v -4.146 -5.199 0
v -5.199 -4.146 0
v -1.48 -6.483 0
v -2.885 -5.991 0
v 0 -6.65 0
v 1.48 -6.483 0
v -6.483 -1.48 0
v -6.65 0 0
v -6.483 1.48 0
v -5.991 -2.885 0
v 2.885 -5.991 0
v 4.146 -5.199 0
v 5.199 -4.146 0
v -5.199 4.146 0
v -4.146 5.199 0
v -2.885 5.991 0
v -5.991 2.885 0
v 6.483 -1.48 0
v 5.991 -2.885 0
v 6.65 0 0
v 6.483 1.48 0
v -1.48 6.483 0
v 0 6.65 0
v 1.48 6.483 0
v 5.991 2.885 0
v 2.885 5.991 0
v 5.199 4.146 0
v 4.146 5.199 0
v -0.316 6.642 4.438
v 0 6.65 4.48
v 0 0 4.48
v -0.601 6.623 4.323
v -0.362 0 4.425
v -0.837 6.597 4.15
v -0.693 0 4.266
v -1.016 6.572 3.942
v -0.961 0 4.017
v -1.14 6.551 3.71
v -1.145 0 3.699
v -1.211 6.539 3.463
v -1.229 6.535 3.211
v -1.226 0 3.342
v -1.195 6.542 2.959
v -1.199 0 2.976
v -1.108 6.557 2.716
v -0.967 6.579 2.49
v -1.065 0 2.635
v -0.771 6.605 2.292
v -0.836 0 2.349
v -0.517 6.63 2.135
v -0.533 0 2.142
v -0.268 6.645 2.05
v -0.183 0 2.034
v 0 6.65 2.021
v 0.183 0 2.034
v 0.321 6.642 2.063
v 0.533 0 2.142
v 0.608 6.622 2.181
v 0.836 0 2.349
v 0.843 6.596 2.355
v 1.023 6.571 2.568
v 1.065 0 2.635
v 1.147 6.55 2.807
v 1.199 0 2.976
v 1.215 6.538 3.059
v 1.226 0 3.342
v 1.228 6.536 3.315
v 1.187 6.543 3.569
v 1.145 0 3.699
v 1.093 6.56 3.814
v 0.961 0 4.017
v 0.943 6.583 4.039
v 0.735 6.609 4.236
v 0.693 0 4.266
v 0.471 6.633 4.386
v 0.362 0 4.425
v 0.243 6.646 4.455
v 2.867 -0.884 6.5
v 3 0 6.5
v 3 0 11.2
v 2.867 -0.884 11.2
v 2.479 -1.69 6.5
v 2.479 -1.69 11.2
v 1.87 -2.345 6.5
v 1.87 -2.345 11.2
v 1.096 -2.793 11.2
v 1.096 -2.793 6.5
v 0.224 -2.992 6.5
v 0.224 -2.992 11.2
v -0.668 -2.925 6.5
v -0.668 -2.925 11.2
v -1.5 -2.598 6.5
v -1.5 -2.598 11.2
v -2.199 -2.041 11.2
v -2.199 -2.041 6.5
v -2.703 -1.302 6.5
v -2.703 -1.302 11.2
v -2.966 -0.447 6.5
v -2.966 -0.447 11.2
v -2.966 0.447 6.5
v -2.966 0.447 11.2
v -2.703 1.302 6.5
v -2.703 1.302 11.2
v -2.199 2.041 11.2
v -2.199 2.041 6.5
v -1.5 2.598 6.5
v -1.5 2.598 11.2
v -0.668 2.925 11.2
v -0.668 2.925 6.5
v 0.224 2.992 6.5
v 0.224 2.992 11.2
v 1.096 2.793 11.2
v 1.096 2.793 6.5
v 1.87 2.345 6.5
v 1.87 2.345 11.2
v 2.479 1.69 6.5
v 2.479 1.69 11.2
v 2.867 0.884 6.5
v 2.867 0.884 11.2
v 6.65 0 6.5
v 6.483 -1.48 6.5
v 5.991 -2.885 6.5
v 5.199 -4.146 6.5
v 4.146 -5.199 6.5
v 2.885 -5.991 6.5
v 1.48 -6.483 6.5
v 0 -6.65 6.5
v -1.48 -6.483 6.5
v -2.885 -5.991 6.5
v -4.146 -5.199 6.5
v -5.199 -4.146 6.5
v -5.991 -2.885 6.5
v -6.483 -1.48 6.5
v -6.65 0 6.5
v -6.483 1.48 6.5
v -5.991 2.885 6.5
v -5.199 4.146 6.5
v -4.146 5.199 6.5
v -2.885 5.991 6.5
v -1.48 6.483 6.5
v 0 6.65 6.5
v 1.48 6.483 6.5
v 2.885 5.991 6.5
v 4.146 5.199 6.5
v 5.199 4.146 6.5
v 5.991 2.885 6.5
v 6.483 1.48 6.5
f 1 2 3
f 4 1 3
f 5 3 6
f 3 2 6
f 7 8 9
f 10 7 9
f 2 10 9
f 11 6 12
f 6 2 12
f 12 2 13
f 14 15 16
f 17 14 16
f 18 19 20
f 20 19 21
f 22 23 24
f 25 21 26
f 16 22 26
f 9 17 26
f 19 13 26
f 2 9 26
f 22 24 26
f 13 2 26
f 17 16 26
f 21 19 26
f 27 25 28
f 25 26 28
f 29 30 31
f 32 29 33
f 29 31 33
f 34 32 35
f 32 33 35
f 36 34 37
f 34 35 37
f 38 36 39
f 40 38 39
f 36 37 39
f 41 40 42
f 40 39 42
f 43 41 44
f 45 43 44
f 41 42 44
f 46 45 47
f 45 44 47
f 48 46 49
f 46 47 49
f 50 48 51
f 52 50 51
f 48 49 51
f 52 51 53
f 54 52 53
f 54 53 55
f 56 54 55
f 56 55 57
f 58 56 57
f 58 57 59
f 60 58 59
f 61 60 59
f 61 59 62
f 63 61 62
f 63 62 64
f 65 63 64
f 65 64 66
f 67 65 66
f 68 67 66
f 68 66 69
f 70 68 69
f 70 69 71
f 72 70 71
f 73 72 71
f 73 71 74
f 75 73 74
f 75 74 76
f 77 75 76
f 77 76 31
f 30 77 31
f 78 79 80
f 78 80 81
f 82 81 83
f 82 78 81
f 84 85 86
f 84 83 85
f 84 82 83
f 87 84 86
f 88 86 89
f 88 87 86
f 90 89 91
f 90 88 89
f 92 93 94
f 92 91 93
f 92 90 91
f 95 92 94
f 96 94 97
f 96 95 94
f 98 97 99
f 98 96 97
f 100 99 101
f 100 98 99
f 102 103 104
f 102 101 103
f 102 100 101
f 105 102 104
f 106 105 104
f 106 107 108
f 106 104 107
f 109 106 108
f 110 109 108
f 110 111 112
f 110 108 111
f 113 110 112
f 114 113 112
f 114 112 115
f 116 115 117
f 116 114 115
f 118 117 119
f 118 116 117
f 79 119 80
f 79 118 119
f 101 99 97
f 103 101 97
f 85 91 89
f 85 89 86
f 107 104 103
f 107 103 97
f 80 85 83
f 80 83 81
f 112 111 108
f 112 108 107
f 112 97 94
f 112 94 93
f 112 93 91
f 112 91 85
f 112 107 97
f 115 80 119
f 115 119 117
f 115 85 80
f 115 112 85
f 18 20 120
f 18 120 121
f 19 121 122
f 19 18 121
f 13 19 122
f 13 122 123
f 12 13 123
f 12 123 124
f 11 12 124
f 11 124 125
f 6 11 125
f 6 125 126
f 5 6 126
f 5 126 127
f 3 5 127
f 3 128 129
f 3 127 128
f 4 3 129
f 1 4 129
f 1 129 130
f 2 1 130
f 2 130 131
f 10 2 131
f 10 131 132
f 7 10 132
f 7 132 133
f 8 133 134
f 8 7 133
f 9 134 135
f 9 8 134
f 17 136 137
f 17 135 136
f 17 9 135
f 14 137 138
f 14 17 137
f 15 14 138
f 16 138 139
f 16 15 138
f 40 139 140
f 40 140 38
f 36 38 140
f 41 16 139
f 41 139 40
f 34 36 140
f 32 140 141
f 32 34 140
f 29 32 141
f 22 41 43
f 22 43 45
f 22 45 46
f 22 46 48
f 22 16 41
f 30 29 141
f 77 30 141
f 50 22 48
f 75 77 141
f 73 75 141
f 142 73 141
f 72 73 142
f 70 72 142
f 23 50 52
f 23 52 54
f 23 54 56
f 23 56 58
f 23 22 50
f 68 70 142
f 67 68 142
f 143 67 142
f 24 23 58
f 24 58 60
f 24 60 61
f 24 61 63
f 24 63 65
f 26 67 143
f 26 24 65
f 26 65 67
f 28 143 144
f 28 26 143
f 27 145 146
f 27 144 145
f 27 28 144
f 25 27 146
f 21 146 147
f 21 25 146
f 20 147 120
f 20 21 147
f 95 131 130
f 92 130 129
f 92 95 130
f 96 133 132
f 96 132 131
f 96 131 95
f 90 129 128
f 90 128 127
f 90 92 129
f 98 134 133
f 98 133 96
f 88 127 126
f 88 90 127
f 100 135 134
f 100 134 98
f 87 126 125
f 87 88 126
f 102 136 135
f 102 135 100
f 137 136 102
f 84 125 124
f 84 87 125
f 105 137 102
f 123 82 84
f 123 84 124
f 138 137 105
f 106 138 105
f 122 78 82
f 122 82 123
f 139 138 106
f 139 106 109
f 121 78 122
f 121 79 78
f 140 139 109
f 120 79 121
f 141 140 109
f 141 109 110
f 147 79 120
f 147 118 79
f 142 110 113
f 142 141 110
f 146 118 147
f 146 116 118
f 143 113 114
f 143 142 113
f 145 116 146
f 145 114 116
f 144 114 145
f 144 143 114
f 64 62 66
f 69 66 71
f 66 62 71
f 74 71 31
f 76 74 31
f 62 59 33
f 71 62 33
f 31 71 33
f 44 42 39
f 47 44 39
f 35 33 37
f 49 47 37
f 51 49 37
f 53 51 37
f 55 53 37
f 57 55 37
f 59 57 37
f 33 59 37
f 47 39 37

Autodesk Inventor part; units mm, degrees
ref_plane "YZ Plane" through (0, 0, 0) normal (1, 0, 0) x (0, 1, 0)
ref_plane "XZ Plane" through (0, 0, 0) normal (0, 1, 0) x (-1, 0, 0)
sketch "Sketch1" plane through (0, 0, 0) normal (0, 0, 1) x (1, 0, 0)
  circle A0 centre (0, 0) radius 6.65
  dimension "d0" = 13.3
extrude "Extrusion1" add sketch "Sketch1" along normal blind 6.5
ref_plane "Work Plane1" through (-6.65, 6.65, 6.5) normal (0, 1, 0) x (1, 0, 0)
sketch "Sketch3" plane through (-6.65, 6.65, 6.5) normal (0, 1, 0) x (1, 0, 0)
  circle A0 centre (6.65, 3.25) radius 1.2
  dimension "d9" = 2.4
hole "Hole1" at (0, 6.65, 3.25) direction (0, -1, 0) diameter 2.459 depth 6.65 thread size "M3x0.5" designation "M3" class "6H" standard "GB Metric profile"
sketch "Sketch4" plane through (0, 0, 6.5) normal (0, 0, 1) x (1, 0, 0)
  circle A0 centre (0, 0) radius 6.65 projected
  circle A1 centre (0, 0) radius 3
  dimension "d17" = 6
extrude "Extrusion3" add sketch "Sketch4" along normal blind 4.7 contours A1
properties part number "hridel kuzelova kolecka"
